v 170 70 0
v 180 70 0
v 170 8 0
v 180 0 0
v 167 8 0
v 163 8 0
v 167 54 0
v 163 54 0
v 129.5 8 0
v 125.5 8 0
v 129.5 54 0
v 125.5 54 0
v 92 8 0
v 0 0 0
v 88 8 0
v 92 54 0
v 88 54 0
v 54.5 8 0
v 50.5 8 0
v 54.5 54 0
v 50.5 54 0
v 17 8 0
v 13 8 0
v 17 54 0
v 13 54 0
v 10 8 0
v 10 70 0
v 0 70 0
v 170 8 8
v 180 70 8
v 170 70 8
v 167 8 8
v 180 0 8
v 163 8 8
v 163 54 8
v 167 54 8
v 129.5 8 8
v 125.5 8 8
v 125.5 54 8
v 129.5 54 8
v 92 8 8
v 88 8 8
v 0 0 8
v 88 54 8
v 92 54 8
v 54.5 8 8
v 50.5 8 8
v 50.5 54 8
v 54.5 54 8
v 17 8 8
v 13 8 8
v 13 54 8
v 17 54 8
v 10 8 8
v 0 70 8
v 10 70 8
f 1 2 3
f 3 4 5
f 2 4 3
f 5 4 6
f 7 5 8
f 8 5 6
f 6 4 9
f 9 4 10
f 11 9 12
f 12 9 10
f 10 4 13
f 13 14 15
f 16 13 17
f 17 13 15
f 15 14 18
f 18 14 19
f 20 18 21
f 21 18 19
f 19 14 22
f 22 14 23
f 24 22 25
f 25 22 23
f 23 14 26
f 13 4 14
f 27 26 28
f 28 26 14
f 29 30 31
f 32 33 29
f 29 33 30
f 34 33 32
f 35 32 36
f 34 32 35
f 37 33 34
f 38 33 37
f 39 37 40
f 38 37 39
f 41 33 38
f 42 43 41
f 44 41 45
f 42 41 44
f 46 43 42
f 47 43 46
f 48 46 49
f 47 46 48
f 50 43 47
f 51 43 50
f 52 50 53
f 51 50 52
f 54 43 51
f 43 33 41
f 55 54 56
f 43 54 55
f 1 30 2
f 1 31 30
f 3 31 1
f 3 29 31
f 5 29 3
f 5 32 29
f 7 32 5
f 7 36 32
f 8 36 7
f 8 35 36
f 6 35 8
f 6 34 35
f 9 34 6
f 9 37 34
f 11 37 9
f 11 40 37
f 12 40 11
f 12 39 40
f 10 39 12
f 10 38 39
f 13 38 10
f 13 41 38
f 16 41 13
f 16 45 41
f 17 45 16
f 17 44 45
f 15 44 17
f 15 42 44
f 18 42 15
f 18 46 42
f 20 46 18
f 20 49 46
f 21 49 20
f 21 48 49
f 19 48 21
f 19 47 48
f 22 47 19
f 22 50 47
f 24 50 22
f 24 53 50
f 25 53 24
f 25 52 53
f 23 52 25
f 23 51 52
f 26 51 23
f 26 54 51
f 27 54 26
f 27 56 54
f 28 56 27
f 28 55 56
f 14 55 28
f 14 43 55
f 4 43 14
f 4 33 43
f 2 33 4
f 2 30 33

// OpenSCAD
$fn = 32;

// ----------------------------------------------------------------------
// Guard grille: 5 slats over a 180 x 70 mm plate
// ----------------------------------------------------------------------

// --- parameters (mm) ---
profile_height = 8;       // extrusion height
profile_points = 28;      // points of the closed outline

profile = [[0, 0], [180, 0], [180, 70], [170, 70], [170, 8], [167, 8], [167, 54], [163, 54], [163, 8], [129.5, 8], [129.5, 54], [125.5, 54], [125.5, 8], [92, 8], [92, 54], [88, 54], [88, 8], [54.5, 8], [54.5, 54], [50.5, 54], [50.5, 8], [17, 8], [17, 54], [13, 54], [13, 8], [10, 8], [10, 70], [0, 70]];  // single closed polygon, 28 points, counter clockwise

// --- the one profile operation ---
linear_extrude(height = profile_height) polygon(points = profile);
